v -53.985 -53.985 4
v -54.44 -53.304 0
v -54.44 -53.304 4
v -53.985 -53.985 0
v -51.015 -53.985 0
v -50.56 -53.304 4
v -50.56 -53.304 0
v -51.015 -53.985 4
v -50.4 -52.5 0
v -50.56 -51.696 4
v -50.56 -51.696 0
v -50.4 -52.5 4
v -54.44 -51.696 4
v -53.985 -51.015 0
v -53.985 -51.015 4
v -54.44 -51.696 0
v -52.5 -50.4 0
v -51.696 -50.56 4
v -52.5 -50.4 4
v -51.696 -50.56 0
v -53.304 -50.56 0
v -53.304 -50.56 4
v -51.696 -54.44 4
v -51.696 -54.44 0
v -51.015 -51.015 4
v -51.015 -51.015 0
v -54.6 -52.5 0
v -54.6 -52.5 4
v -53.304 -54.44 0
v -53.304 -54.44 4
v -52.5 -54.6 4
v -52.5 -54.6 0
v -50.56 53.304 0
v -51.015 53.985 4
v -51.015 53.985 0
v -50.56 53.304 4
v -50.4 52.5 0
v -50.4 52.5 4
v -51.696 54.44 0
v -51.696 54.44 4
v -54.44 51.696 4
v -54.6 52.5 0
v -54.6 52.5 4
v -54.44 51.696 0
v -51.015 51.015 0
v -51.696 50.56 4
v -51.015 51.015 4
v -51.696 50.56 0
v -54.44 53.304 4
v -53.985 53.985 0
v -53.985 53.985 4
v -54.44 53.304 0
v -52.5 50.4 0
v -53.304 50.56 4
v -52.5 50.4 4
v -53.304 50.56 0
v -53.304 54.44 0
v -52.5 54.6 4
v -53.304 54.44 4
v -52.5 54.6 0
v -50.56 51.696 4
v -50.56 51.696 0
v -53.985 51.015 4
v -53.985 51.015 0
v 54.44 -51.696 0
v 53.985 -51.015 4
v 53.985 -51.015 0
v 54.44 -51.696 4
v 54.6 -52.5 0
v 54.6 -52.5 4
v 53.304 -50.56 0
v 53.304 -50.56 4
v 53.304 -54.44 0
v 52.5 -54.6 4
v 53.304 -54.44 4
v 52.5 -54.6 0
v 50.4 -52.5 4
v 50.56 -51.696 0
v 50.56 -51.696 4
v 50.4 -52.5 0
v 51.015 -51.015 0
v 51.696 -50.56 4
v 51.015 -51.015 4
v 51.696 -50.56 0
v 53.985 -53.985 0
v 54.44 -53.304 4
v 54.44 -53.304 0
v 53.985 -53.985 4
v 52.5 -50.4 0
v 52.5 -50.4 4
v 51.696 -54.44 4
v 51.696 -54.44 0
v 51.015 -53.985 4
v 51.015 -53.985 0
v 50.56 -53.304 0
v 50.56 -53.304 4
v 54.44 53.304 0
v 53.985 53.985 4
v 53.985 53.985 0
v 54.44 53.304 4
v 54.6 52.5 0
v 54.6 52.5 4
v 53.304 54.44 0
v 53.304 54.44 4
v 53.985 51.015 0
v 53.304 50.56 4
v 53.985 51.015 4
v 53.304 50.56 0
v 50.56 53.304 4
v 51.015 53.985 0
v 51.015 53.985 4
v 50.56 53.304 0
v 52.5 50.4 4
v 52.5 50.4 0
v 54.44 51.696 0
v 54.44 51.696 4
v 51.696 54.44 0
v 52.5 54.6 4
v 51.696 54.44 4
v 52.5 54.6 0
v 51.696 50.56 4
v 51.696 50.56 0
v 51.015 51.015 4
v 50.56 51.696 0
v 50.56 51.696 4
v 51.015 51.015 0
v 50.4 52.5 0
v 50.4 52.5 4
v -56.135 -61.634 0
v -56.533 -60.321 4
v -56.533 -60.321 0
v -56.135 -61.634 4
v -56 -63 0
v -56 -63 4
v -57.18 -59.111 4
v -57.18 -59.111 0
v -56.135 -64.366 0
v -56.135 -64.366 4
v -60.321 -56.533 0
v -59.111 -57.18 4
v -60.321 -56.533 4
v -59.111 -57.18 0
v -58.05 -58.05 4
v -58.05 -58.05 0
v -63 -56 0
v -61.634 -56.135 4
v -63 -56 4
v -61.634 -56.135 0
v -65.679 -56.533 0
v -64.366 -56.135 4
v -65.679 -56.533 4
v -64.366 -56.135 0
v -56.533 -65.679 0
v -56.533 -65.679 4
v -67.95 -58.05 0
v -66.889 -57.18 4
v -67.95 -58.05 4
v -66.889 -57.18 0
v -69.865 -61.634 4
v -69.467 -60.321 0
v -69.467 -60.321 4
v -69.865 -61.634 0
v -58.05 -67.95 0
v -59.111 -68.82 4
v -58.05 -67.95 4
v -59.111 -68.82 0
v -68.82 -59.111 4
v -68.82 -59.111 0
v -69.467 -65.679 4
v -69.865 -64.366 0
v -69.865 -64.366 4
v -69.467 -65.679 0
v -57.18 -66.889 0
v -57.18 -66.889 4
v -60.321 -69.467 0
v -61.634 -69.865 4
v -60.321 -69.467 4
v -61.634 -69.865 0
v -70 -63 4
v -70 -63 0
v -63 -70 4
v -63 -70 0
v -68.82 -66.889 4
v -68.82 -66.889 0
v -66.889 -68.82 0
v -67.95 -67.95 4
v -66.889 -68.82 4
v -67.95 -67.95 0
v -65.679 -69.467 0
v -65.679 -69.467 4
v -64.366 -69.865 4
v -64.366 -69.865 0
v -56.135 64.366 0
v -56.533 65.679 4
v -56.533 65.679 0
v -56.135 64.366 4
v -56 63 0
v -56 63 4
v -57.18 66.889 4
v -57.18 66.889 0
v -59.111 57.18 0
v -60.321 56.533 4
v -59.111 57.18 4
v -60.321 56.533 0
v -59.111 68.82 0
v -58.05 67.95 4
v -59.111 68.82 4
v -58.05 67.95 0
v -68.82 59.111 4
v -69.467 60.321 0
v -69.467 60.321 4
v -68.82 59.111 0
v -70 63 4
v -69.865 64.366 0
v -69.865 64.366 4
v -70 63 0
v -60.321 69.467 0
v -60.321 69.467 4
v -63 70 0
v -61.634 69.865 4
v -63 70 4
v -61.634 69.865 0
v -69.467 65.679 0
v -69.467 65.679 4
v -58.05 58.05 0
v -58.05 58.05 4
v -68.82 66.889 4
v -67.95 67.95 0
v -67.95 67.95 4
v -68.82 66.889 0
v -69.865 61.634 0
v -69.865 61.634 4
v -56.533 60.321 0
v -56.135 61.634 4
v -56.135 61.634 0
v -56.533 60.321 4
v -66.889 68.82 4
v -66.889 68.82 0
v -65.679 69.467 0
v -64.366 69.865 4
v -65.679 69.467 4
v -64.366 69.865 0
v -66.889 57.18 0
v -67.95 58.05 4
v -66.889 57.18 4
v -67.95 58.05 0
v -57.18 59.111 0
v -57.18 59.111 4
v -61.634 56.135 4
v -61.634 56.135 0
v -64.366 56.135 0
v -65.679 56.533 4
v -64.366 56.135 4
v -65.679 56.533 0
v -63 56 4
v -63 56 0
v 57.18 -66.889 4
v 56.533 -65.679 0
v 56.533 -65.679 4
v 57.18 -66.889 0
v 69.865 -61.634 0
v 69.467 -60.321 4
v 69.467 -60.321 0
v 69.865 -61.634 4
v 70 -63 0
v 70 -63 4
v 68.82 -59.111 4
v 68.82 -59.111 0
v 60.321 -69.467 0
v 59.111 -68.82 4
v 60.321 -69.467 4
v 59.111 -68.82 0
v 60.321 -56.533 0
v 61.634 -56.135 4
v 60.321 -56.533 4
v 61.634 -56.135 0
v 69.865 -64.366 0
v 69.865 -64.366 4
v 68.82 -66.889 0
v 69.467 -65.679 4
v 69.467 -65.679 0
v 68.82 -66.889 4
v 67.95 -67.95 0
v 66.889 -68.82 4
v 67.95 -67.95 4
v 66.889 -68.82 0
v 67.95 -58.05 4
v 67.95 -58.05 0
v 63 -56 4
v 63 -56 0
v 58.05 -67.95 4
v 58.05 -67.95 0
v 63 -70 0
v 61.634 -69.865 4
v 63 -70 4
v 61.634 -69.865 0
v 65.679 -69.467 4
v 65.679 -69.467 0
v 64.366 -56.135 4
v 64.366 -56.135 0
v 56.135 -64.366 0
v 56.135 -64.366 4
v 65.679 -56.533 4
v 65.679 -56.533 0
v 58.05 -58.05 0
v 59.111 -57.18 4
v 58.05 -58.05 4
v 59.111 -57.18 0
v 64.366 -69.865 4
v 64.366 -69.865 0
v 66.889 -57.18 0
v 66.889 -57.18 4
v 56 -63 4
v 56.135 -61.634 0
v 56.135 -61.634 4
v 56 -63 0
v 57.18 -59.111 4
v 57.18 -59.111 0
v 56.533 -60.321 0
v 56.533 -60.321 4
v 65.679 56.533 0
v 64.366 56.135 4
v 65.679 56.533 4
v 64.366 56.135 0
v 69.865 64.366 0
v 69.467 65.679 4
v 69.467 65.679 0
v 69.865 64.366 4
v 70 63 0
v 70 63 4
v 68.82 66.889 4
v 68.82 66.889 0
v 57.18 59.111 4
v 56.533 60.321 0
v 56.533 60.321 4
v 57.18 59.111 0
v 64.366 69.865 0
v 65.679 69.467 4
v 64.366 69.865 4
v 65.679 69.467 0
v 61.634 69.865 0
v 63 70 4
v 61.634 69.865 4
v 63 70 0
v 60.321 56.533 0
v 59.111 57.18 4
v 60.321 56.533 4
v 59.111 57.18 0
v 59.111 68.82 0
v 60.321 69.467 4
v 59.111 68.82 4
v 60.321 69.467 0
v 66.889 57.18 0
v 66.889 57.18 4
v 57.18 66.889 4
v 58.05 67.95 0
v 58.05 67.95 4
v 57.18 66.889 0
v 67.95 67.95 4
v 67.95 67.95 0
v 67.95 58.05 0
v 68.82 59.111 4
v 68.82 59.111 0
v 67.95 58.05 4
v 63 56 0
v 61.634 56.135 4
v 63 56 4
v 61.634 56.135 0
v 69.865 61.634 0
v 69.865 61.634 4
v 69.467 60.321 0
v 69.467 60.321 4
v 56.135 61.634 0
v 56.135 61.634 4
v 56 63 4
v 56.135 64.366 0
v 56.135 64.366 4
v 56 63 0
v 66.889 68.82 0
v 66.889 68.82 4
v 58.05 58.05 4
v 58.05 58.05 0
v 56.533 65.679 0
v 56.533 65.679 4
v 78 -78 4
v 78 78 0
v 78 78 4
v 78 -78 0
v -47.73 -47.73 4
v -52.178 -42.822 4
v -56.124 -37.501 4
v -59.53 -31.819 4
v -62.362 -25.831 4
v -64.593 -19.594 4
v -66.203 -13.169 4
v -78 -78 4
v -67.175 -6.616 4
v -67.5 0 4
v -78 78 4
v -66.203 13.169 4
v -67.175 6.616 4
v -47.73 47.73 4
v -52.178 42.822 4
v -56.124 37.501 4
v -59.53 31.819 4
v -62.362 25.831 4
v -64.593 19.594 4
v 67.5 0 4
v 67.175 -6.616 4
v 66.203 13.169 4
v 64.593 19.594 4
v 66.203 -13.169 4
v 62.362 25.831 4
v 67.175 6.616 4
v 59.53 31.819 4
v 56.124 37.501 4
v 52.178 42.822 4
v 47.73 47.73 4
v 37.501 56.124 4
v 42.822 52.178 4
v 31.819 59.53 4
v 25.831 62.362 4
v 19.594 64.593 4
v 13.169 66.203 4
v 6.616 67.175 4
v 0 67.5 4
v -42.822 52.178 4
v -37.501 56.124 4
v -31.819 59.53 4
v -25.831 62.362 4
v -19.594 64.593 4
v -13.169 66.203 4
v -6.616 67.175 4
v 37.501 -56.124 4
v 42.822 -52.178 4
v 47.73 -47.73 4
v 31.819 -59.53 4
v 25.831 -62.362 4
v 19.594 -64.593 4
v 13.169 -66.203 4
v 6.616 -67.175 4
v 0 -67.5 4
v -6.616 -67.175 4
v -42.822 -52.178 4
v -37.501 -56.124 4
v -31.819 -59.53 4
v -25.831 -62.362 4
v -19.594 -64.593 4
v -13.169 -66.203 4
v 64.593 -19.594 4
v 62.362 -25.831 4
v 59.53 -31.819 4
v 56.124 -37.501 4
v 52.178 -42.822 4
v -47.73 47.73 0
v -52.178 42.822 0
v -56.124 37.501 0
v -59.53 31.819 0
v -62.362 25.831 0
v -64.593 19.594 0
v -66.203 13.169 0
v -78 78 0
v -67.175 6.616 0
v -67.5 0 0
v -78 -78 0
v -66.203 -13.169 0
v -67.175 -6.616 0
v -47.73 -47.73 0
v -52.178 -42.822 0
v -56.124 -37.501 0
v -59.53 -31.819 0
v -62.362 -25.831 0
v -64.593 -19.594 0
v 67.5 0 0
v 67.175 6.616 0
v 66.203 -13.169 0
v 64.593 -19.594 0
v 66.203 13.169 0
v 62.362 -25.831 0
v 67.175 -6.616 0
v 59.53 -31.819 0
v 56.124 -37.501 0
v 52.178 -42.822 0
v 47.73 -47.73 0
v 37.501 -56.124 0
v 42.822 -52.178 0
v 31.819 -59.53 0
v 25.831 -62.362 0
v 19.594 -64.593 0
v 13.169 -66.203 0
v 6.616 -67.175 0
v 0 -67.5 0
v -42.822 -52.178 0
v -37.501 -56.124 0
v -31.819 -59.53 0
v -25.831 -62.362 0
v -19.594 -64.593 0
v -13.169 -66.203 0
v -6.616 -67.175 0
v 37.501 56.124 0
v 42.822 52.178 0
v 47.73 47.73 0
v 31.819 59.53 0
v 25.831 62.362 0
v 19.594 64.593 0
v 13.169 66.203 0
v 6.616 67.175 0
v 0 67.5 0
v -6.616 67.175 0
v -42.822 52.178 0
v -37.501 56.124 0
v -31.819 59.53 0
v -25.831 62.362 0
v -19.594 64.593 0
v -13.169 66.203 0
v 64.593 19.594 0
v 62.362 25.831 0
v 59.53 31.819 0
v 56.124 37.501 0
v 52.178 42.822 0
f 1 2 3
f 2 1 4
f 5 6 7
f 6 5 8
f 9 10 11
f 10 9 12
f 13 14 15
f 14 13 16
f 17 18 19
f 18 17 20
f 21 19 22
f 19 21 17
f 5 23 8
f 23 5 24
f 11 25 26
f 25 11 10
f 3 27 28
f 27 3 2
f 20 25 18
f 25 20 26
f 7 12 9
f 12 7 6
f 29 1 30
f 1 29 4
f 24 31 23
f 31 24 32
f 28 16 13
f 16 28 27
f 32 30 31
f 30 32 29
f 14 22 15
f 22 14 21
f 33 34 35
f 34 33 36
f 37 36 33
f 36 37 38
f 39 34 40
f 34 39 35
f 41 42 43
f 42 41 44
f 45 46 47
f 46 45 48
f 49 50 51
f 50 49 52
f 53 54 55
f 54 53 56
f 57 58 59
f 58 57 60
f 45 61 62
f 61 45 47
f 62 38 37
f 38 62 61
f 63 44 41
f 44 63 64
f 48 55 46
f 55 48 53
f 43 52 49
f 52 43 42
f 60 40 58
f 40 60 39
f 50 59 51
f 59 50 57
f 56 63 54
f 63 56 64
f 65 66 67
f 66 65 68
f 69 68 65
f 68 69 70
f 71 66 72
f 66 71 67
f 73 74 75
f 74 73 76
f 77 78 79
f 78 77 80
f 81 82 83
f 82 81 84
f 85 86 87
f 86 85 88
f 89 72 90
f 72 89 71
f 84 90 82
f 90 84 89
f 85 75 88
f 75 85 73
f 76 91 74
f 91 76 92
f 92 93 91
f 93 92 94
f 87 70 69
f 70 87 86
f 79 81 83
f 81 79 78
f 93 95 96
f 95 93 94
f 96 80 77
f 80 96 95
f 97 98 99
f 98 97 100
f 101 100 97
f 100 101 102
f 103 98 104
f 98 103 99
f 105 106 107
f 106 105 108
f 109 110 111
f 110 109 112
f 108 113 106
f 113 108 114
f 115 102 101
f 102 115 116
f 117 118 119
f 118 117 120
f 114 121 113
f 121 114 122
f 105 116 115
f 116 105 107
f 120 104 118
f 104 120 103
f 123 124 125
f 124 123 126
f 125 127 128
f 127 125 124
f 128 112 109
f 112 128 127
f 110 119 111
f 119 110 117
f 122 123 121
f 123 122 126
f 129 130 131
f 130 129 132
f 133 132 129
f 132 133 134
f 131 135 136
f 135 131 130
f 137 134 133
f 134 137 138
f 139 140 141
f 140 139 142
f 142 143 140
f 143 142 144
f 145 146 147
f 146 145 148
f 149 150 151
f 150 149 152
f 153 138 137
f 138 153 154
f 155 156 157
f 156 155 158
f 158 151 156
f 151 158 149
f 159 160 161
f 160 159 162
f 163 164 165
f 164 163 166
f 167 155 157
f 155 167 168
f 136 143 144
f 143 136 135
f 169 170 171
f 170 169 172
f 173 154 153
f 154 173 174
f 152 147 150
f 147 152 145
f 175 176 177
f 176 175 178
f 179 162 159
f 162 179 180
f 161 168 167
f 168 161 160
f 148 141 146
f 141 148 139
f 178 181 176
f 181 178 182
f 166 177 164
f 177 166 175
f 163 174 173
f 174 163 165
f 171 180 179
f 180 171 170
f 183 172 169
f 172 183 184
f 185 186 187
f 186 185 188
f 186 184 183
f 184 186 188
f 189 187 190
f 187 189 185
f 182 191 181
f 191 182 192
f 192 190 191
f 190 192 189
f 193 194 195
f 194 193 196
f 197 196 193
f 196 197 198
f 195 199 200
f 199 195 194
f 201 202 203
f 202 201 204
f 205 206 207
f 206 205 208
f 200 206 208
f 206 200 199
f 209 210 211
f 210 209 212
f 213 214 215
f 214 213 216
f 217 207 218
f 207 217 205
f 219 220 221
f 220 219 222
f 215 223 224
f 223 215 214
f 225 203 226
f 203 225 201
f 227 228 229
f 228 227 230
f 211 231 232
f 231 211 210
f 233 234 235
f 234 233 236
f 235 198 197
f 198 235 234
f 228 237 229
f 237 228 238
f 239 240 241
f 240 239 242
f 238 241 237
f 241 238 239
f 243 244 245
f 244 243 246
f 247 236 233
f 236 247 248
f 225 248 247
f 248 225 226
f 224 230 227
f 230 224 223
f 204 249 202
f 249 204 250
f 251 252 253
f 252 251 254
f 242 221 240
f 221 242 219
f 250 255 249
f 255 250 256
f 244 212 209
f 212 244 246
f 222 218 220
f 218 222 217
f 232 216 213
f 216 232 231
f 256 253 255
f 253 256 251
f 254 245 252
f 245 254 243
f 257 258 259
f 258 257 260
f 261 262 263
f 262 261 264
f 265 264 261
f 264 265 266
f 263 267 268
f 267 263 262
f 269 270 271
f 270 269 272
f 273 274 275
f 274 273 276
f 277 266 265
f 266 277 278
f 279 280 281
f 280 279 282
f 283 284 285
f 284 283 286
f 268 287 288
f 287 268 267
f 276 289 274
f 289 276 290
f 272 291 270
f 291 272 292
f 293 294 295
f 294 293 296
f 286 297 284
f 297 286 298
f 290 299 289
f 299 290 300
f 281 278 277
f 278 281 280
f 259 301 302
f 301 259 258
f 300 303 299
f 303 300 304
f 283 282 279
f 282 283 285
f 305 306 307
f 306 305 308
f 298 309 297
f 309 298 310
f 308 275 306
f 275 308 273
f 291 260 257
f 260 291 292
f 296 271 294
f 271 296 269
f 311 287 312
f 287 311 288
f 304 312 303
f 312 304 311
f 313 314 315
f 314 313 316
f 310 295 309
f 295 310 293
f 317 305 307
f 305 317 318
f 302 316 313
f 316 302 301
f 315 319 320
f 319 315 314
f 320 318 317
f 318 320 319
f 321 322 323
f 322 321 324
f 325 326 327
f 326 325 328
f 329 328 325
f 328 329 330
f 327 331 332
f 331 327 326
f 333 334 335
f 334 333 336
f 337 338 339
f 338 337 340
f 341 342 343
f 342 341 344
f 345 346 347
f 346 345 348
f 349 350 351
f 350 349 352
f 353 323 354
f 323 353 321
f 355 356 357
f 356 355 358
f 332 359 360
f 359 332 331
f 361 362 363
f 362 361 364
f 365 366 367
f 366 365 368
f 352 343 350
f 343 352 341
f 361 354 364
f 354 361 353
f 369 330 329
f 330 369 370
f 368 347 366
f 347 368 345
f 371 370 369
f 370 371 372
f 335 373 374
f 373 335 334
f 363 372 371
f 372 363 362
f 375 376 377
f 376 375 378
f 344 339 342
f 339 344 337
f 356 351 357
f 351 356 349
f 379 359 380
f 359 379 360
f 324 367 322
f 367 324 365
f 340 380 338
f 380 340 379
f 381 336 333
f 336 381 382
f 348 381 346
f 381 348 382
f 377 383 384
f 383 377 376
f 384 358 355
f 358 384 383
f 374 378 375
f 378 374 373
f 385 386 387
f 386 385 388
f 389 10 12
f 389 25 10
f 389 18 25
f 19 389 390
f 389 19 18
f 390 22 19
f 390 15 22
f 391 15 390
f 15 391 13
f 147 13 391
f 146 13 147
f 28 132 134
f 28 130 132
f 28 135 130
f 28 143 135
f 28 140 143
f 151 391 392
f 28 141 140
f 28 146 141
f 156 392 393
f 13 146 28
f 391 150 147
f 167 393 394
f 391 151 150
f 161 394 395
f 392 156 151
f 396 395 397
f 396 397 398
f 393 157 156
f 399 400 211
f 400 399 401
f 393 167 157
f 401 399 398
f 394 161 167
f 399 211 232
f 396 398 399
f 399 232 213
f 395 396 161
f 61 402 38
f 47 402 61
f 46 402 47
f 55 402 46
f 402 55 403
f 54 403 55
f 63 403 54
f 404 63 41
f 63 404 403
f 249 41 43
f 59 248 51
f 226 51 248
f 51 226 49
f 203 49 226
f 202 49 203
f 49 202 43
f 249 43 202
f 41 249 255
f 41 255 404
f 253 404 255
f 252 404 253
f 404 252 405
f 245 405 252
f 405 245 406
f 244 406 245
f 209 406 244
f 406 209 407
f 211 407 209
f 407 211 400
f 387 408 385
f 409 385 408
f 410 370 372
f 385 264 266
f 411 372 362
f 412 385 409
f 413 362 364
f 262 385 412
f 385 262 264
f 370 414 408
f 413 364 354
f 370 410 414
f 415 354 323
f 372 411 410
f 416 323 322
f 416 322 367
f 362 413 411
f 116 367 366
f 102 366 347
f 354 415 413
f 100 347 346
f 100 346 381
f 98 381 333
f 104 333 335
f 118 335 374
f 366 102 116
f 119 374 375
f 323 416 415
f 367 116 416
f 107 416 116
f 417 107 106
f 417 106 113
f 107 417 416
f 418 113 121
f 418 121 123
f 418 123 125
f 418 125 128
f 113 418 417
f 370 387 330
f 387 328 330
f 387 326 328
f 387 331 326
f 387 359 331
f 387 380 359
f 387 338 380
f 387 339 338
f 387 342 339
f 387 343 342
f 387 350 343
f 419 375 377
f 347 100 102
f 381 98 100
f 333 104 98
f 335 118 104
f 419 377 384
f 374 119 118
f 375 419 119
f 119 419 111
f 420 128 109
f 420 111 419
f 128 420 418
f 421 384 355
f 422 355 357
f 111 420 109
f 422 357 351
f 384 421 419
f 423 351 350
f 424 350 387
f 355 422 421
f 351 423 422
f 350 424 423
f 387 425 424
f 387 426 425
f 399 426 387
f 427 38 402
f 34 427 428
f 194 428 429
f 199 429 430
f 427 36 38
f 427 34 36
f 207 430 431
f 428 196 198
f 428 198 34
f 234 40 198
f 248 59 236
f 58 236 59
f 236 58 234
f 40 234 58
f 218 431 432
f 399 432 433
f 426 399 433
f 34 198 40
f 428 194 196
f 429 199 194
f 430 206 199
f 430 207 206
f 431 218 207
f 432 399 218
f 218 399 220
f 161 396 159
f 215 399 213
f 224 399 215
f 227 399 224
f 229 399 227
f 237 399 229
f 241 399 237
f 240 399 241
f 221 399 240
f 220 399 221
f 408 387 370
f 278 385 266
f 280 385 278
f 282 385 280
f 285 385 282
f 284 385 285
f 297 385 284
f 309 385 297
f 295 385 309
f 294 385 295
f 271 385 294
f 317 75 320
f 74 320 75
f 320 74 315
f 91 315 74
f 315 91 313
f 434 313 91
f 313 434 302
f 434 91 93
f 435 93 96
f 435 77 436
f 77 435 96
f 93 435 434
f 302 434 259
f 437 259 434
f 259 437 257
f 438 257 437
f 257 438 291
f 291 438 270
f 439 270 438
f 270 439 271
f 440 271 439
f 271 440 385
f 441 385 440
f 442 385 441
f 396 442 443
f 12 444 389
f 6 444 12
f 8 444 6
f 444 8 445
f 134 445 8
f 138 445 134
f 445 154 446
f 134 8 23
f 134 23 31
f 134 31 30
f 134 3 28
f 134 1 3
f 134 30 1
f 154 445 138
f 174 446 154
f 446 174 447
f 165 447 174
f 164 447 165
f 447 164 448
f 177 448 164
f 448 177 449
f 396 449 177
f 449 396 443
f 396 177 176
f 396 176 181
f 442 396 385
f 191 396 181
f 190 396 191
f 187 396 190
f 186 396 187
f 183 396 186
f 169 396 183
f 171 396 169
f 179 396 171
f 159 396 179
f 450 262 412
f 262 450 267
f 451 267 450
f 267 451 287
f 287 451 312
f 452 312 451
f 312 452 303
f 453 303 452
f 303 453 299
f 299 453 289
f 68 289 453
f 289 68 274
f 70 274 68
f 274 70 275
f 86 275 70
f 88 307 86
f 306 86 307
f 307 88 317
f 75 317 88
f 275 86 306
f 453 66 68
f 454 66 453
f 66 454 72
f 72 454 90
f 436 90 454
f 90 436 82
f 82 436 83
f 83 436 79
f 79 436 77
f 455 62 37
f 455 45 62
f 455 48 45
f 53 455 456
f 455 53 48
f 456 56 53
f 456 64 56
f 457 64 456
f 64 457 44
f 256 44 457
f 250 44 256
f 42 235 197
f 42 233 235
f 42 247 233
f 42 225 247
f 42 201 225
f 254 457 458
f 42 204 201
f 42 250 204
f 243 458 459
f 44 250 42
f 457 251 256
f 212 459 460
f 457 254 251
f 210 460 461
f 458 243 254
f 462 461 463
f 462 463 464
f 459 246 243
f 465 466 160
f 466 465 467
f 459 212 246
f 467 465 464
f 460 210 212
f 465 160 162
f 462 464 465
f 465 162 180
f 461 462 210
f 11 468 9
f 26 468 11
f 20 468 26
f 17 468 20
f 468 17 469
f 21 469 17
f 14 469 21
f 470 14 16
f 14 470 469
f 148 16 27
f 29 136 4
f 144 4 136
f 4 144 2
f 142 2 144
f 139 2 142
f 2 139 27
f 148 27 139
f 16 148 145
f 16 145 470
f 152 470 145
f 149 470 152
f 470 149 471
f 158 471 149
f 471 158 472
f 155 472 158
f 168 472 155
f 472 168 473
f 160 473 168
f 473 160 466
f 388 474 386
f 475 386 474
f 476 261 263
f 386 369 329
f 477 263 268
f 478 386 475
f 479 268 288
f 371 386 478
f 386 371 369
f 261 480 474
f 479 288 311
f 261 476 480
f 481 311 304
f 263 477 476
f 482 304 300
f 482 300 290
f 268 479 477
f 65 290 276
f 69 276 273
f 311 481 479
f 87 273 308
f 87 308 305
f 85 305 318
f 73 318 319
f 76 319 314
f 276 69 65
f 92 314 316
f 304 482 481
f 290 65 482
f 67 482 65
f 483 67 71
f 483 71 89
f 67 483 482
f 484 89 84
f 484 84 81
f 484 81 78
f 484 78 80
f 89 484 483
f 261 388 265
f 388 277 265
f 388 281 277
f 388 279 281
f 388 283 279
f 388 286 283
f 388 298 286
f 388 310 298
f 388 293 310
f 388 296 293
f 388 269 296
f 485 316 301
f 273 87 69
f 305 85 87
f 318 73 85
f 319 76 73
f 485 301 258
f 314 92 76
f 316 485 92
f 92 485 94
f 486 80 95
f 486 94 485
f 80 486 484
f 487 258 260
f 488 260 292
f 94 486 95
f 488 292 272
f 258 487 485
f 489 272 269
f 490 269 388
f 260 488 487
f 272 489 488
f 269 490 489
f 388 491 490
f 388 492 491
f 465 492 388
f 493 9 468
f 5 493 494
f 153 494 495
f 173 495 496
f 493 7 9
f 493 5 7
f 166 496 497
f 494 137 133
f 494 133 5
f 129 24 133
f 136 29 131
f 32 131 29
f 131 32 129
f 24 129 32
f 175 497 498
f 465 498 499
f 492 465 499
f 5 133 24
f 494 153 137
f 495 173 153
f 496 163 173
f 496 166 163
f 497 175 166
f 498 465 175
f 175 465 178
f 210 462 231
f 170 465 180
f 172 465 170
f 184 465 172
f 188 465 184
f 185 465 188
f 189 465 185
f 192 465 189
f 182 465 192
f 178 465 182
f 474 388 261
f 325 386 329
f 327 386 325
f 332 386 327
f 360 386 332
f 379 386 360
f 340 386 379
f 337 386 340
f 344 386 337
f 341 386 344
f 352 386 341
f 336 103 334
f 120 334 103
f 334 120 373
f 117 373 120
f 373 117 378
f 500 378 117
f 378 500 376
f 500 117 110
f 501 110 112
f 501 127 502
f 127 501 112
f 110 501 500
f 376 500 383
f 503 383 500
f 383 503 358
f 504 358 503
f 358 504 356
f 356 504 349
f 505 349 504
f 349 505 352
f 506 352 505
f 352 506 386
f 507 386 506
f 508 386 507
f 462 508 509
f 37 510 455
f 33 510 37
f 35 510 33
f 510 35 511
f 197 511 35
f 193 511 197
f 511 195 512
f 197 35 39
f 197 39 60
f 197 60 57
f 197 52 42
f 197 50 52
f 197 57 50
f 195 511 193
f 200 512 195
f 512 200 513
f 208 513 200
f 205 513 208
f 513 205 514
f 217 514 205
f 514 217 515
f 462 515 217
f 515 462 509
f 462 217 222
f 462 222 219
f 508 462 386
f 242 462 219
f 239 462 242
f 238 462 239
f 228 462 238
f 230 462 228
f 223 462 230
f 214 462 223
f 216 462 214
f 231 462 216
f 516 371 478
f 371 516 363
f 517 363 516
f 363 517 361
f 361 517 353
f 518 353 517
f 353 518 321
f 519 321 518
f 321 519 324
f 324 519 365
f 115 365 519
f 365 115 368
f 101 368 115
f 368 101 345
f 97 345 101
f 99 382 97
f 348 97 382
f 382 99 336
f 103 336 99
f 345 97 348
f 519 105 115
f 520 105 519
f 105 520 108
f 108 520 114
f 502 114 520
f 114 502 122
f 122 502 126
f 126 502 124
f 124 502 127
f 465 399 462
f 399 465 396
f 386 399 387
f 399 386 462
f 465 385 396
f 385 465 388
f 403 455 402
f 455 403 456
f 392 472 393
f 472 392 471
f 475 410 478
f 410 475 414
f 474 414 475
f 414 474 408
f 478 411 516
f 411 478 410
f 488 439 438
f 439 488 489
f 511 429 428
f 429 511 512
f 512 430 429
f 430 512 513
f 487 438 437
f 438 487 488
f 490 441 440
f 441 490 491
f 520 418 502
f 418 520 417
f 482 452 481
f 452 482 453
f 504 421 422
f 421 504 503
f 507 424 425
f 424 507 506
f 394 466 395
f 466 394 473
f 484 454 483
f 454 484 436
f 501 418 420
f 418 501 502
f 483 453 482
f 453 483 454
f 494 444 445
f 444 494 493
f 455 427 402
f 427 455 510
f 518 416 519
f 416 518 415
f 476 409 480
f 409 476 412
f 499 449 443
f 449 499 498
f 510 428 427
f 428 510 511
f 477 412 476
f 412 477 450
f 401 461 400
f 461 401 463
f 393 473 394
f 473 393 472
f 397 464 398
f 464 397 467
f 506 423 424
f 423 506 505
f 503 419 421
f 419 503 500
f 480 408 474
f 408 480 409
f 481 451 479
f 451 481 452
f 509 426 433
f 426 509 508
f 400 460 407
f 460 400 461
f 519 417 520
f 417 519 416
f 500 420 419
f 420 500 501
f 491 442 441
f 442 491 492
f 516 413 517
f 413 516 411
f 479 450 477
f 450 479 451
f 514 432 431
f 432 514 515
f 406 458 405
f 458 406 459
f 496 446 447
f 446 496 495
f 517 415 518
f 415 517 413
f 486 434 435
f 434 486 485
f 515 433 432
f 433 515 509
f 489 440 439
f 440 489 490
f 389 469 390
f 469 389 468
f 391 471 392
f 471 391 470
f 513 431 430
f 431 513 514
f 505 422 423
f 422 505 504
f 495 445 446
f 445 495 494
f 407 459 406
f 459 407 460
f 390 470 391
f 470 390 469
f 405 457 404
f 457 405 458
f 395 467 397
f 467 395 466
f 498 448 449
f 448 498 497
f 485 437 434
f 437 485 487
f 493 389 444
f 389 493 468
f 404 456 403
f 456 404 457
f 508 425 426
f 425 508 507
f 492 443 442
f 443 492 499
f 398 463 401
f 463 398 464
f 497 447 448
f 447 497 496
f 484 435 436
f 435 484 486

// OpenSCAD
// =============================================================================
// ISKANDER HEARTH — 140mm Fan Adapter v1
// File: fan_140mm_adapter_v1.scad
// =============================================================================
// License : CERN Open Hardware Licence v2 – Strongly Reciprocal (CERN-OHL-S)
// Phase   : 7 — Thermal & Acoustic Validation
//
// An adapter plate that mounts to the chassis' standard 120mm fan position
// (105mm screw pattern, 115mm aperture) and provides a 140mm fan mount.
//
// USE CASE:
//   The chassis top or rear panel has a 120mm fan position (cut in OpenSCAD
//   with fan_cutout() using fan_size=120, fan_screw_spacing=105).
//   This adapter installs into that position, covering the 120mm hole and
//   providing a new 125mm screw hole pattern for a Noctua NF-A14 PWM (P7-002).
//
// NOCTUA NF-A14 PWM (P7-002) specs:
//   Frame: 140×140mm | Aperture: 135mm | Screw spacing: 124.5mm (≈ 125mm)
//   Max flow: 140.2 m³/h (37% more than NF-A12x25 at equivalent RPM)
//   Max noise: 24.6 dBA vs 22.6 dBA for NF-A12x25
//
// TRADE-OFF:
//   More airflow per dBA at low RPM — better for living room deployment.
//   Requires a 140mm chassis cutout (top panel mod or this adapter + hole enlargement).
//
// PRINT SETTINGS:
//   Material: PETG | Layer: 0.2mm | Perimeters: 4 | Infill: 30% rectilinear
//   Orientation: Flat (plate lying on build surface) — zero supports needed.
// =============================================================================


// =============================================================================
// SECTION 1 — PARAMETERS
// =============================================================================

// --- Chassis 120mm fan position (to mount onto) ---
chassis_fan_size         = 120;    // [mm] Chassis panel fan cutout outer frame
chassis_fan_aperture_d   = 115;    // [mm] Existing chassis fan aperture diameter
chassis_screw_spacing    = 105;    // [mm] Existing chassis screw hole spacing (120mm fan)
chassis_screw_d          = 4.2;    // [mm] M4 clearance for chassis-side screws

// --- 140mm fan to mount on adapter ---
fan_140_size             = 140;    // [mm] NF-A14 frame
fan_140_aperture_d       = 135;    // [mm] NF-A14 clear airflow aperture
fan_140_screw_spacing    = 124.5;  // [mm] NF-A14 screw hole spacing (125mm nominal)
fan_140_screw_d          = 4.2;    // [mm] M4 clearance for fan-side screws

// --- Adapter plate ---
adapter_t                = 4.0;    // [mm] Plate thickness (rigid, ≥ 4mm)
adapter_margin           = 8;      // [mm] Extra material beyond 140mm fan frame

// --- Derived ---
adapter_size             = fan_140_size + adapter_margin * 2;  // Total plate size
chassis_screw_half       = chassis_screw_spacing / 2;
fan_140_screw_half       = fan_140_screw_spacing / 2;


// =============================================================================
// SECTION 2 — MODULES
// =============================================================================

module fan_140mm_adapter() {
    difference() {
        // Adapter body — square plate, centred at origin
        translate([-adapter_size / 2, -adapter_size / 2, 0])
        cube([adapter_size, adapter_size, adapter_t]);

        // ── Central airflow aperture ───────────────────────────────────────────
        // Sized to 140mm fan aperture — this is the dominant flow path.
        // The existing 120mm chassis hole is fully contained within this opening.
        translate([0, 0, -0.1])
        cylinder(d = fan_140_aperture_d, h = adapter_t + 0.2, $fn = 64);

        // ── 120mm chassis-side screw holes (attach adapter to chassis) ────────
        // These align with the existing 105mm screw pattern in the chassis panel.
        for (sx = [-chassis_screw_half, chassis_screw_half]) {
            for (sy = [-chassis_screw_half, chassis_screw_half]) {
                translate([sx, sy, -0.1])
                cylinder(d = chassis_screw_d, h = adapter_t + 0.2, $fn = 16);
            }
        }

        // ── 140mm fan-side screw holes (attach NF-A14 to adapter) ─────────────
        // 125mm screw pattern for Noctua NF-A14.
        // These are countersunk: M4 pan-head sits flush with adapter top face.
        for (sx = [-fan_140_screw_half, fan_140_screw_half]) {
            for (sy = [-fan_140_screw_half, fan_140_screw_half]) {
                // Clearance hole through full thickness
                translate([sx, sy, -0.1])
                cylinder(d = fan_140_screw_d, h = adapter_t + 0.2, $fn = 16);

                // Countersink (M4 pan-head: 8mm head diameter, 2.5mm head height)
                translate([sx, sy, adapter_t - 2.5])
                cylinder(d1 = fan_140_screw_d, d2 = 8.5, h = 2.6, $fn = 16);
            }
        }

        // ── Lightening holes ──────────────────────────────────────────────────
        // Reduce mass without compromising rigidity.
        // Placed in the 4 corner zones between screw holes, clear of all holes.
        for (lx = [-1, 1]) {
            for (ly = [-1, 1]) {
                translate([lx * (adapter_size / 2 - 15), ly * (adapter_size / 2 - 15), -0.1])
                cylinder(d = 14, h = adapter_t + 0.2, $fn = 32);
            }
        }
    }

    // Embossed label: "120→140 ADAPTER" on top face
    // Uncomment when font is available:
    // translate([-25, -adapter_size/2 + 4, adapter_t])
    // linear_extrude(height = 0.8)
    // text("120→140 ADAPTER", size = 5, font = "Liberation Sans:style=Bold");
}


// =============================================================================
// SECTION 3 — FAN ALIGNMENT GUIDE
// Prints a positioning jig to drill the correct 140mm hole in an existing panel.
// Uncomment to render.
// =============================================================================

// module drill_guide() {
//     difference() {
//         // Guide ring: sits inside the existing 115mm aperture
//         cylinder(d = chassis_fan_aperture_d - 1, h = 6, $fn = 64);
//         // Mark the 125mm screw positions
//         for (sx = [-fan_140_screw_half, fan_140_screw_half]) {
//             for (sy = [-fan_140_screw_half, fan_140_screw_half]) {
//                 translate([sx, sy, -0.1])
//                 cylinder(d = 2.5, h = 7, $fn = 16);  // 2.5mm pilot hole markers
//             }
//         }
//         // Centre mark
//         translate([0, 0, -0.1]) cylinder(d = 3, h = 7, $fn = 16);
//     }
// }


// =============================================================================
// SECTION 4 — RENDER
// =============================================================================

fan_140mm_adapter();

// drill_guide();   // <-- uncomment to print alignment jig separately

// Ghost overlays for design verification:
// %translate([0, 0, adapter_t]) color("silver", 0.2)
//   cube([fan_140_size, fan_140_size, 25], center = true);  // NF-A14 ghost
// %color("navy", 0.15)
//   cylinder(d = chassis_fan_aperture_d, h = 4, $fn = 64);  // 120mm chassis aperture
